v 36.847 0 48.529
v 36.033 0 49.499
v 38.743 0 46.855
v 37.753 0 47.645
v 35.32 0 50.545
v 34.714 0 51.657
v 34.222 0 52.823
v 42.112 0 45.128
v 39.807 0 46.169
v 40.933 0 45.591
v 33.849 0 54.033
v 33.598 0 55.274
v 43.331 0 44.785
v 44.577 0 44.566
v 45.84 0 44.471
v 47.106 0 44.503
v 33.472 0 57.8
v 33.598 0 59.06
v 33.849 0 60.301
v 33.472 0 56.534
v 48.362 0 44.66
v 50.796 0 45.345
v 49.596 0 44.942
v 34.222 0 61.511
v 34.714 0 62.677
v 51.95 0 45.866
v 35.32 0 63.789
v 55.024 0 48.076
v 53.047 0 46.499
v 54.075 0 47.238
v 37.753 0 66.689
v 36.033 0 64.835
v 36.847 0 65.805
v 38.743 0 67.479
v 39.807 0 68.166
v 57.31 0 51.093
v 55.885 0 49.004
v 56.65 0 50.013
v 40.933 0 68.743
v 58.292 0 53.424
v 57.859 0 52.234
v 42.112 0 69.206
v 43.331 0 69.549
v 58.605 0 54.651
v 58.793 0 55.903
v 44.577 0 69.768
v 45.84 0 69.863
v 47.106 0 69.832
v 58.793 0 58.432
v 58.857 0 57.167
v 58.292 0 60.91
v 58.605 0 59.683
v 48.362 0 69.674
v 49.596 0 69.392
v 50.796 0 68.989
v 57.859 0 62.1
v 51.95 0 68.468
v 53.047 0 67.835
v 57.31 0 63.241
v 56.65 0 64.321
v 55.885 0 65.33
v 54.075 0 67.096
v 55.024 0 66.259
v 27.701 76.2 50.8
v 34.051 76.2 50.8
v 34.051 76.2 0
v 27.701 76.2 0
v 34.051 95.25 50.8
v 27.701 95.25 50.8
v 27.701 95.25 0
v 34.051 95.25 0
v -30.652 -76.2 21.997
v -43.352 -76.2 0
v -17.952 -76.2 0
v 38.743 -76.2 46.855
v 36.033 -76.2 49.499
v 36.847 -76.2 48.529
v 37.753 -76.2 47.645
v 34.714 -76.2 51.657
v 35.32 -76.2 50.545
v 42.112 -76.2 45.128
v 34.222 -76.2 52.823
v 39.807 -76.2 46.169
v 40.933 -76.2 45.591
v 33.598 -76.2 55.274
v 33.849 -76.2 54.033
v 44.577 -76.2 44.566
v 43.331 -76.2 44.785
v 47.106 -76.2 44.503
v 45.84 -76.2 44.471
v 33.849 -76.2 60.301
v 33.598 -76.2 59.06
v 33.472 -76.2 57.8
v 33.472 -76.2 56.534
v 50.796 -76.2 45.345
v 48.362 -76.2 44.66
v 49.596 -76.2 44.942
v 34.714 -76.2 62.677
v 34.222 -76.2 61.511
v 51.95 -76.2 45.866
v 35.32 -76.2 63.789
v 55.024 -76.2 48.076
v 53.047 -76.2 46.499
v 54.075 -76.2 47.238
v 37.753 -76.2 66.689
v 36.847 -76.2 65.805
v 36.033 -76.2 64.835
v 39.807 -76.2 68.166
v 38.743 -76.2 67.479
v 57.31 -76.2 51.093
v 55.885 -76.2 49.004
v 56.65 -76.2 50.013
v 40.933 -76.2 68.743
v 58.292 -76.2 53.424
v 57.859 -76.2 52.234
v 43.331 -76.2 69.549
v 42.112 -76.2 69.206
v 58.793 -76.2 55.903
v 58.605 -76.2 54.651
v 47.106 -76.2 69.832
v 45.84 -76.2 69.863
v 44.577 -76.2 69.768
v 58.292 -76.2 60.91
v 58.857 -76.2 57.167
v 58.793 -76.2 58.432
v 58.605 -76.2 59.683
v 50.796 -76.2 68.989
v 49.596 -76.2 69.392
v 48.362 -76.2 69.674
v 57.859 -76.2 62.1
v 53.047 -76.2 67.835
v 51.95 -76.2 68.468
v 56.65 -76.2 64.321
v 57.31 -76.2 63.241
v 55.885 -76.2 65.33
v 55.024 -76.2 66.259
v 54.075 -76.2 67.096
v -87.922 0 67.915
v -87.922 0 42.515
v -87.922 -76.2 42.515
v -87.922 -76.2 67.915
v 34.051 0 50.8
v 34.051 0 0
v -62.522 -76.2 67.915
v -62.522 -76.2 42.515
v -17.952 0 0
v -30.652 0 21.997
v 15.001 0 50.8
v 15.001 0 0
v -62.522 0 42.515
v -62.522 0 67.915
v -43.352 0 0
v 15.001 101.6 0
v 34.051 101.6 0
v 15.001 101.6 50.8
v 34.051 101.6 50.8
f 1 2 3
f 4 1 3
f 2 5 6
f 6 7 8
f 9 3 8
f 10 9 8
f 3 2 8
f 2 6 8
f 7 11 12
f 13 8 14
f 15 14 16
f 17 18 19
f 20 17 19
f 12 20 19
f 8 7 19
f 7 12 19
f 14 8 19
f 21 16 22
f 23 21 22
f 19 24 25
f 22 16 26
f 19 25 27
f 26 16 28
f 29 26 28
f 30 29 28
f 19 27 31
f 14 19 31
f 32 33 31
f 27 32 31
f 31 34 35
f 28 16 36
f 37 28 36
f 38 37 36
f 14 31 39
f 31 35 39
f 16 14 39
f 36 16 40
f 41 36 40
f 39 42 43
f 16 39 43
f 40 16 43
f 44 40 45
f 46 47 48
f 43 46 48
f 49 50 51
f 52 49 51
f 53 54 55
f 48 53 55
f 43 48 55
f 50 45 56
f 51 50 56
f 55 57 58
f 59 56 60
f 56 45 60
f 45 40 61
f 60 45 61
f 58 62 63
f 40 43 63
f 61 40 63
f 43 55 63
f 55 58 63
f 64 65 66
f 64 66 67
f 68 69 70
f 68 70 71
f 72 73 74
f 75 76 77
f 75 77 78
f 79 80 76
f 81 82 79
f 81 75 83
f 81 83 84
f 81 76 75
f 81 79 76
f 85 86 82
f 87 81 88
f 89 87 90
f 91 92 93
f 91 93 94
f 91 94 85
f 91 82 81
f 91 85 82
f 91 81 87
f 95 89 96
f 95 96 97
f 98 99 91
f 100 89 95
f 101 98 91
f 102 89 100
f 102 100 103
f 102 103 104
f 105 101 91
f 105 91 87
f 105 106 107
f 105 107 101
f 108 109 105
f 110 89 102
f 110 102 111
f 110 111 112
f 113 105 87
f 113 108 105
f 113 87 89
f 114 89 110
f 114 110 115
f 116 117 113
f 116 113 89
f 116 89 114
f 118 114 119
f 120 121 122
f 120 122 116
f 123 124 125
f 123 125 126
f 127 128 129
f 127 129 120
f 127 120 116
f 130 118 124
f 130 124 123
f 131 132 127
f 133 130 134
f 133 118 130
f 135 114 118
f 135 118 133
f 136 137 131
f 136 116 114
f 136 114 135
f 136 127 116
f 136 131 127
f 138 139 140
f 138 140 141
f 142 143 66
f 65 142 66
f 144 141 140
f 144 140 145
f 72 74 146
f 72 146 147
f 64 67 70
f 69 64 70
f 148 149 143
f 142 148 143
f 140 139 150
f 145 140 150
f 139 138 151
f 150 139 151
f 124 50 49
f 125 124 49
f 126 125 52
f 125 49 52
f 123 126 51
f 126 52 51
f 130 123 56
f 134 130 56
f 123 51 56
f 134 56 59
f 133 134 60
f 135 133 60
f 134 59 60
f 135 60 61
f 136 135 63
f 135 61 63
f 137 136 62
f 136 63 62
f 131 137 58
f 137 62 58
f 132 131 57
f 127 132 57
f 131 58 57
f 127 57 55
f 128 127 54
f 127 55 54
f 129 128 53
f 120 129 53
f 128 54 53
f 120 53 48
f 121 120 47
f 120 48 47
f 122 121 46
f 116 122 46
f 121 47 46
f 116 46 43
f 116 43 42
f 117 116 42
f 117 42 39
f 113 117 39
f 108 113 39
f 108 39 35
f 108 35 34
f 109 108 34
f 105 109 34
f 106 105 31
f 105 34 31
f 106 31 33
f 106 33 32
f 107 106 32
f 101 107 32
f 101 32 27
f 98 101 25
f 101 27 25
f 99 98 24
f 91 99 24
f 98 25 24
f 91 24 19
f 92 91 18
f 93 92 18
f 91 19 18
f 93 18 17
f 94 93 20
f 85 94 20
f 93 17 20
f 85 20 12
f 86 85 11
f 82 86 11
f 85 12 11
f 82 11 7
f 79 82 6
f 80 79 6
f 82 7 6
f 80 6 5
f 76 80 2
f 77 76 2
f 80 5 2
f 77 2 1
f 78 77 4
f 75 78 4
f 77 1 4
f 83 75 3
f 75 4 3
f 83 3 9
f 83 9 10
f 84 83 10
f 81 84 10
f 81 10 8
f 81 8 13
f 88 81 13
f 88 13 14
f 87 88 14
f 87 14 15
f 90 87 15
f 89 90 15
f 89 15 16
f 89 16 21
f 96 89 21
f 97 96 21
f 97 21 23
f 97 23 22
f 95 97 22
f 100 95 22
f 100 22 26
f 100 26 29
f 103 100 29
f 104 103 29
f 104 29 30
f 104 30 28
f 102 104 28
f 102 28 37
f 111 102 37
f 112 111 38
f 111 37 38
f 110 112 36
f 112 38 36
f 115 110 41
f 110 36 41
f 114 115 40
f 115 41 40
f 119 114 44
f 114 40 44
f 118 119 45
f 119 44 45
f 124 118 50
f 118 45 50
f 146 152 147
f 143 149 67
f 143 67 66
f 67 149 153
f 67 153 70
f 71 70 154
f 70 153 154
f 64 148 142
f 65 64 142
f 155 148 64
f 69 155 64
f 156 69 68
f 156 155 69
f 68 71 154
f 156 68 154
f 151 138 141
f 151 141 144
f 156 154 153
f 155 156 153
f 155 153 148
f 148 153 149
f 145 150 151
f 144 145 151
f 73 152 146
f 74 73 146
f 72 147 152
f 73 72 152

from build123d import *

# Parameters (mm, degrees)
F0_R     = 12.7
F1_DEPTH = 76.2
F0_W     = 25.4
F0_H     = 25.4
F3_DEPTH = 50.8


# Not quite as in the source:
# - a feature names something its author has since deleted; it is built from what else it names


with BuildPart() as f1:
    # F0 (on Front) → F1 (new body)
    with BuildSketch(Plane.XZ):
        with Locations((46.1565467664, 57.1670281734)):
            Circle(F0_R)
    extrude(amount=F1_DEPTH)


with BuildPart() as f1b:
    # F0 (on Front) → F1, piece 2 (new body)
    with BuildSketch(Plane.XZ):
        with Locations((-75.2221422301, 55.2151392767)):
            Rectangle(F0_W, F0_H)
    extrude(amount=F1_DEPTH)


with BuildPart() as f1c:
    # F0 (on Front) → F1, piece 3 (new body)
    with BuildSketch(Plane.XZ):
        Polygon((-43.352026199, 0), (-17.952026199, 0), (-30.652026199, 21.9970452561), align=None)
    extrude(amount=F1_DEPTH)


with BuildPart() as f3:
    # F2 (on Top) → F3 (new body)
    with BuildSketch(Plane.XY):
        Polygon((34.0507993009, 95.25), (34.0507993009, 101.6), (15.0007993009, 101.6), (15.0007993009, 0), (34.0507993009, 0), (34.0507993009, 76.2), (27.7007993009, 76.2), (27.7007993009, 95.25), align=None)
    extrude(amount=F3_DEPTH)


solid = Compound([f1.part, f1b.part, f1c.part, f3.part])
